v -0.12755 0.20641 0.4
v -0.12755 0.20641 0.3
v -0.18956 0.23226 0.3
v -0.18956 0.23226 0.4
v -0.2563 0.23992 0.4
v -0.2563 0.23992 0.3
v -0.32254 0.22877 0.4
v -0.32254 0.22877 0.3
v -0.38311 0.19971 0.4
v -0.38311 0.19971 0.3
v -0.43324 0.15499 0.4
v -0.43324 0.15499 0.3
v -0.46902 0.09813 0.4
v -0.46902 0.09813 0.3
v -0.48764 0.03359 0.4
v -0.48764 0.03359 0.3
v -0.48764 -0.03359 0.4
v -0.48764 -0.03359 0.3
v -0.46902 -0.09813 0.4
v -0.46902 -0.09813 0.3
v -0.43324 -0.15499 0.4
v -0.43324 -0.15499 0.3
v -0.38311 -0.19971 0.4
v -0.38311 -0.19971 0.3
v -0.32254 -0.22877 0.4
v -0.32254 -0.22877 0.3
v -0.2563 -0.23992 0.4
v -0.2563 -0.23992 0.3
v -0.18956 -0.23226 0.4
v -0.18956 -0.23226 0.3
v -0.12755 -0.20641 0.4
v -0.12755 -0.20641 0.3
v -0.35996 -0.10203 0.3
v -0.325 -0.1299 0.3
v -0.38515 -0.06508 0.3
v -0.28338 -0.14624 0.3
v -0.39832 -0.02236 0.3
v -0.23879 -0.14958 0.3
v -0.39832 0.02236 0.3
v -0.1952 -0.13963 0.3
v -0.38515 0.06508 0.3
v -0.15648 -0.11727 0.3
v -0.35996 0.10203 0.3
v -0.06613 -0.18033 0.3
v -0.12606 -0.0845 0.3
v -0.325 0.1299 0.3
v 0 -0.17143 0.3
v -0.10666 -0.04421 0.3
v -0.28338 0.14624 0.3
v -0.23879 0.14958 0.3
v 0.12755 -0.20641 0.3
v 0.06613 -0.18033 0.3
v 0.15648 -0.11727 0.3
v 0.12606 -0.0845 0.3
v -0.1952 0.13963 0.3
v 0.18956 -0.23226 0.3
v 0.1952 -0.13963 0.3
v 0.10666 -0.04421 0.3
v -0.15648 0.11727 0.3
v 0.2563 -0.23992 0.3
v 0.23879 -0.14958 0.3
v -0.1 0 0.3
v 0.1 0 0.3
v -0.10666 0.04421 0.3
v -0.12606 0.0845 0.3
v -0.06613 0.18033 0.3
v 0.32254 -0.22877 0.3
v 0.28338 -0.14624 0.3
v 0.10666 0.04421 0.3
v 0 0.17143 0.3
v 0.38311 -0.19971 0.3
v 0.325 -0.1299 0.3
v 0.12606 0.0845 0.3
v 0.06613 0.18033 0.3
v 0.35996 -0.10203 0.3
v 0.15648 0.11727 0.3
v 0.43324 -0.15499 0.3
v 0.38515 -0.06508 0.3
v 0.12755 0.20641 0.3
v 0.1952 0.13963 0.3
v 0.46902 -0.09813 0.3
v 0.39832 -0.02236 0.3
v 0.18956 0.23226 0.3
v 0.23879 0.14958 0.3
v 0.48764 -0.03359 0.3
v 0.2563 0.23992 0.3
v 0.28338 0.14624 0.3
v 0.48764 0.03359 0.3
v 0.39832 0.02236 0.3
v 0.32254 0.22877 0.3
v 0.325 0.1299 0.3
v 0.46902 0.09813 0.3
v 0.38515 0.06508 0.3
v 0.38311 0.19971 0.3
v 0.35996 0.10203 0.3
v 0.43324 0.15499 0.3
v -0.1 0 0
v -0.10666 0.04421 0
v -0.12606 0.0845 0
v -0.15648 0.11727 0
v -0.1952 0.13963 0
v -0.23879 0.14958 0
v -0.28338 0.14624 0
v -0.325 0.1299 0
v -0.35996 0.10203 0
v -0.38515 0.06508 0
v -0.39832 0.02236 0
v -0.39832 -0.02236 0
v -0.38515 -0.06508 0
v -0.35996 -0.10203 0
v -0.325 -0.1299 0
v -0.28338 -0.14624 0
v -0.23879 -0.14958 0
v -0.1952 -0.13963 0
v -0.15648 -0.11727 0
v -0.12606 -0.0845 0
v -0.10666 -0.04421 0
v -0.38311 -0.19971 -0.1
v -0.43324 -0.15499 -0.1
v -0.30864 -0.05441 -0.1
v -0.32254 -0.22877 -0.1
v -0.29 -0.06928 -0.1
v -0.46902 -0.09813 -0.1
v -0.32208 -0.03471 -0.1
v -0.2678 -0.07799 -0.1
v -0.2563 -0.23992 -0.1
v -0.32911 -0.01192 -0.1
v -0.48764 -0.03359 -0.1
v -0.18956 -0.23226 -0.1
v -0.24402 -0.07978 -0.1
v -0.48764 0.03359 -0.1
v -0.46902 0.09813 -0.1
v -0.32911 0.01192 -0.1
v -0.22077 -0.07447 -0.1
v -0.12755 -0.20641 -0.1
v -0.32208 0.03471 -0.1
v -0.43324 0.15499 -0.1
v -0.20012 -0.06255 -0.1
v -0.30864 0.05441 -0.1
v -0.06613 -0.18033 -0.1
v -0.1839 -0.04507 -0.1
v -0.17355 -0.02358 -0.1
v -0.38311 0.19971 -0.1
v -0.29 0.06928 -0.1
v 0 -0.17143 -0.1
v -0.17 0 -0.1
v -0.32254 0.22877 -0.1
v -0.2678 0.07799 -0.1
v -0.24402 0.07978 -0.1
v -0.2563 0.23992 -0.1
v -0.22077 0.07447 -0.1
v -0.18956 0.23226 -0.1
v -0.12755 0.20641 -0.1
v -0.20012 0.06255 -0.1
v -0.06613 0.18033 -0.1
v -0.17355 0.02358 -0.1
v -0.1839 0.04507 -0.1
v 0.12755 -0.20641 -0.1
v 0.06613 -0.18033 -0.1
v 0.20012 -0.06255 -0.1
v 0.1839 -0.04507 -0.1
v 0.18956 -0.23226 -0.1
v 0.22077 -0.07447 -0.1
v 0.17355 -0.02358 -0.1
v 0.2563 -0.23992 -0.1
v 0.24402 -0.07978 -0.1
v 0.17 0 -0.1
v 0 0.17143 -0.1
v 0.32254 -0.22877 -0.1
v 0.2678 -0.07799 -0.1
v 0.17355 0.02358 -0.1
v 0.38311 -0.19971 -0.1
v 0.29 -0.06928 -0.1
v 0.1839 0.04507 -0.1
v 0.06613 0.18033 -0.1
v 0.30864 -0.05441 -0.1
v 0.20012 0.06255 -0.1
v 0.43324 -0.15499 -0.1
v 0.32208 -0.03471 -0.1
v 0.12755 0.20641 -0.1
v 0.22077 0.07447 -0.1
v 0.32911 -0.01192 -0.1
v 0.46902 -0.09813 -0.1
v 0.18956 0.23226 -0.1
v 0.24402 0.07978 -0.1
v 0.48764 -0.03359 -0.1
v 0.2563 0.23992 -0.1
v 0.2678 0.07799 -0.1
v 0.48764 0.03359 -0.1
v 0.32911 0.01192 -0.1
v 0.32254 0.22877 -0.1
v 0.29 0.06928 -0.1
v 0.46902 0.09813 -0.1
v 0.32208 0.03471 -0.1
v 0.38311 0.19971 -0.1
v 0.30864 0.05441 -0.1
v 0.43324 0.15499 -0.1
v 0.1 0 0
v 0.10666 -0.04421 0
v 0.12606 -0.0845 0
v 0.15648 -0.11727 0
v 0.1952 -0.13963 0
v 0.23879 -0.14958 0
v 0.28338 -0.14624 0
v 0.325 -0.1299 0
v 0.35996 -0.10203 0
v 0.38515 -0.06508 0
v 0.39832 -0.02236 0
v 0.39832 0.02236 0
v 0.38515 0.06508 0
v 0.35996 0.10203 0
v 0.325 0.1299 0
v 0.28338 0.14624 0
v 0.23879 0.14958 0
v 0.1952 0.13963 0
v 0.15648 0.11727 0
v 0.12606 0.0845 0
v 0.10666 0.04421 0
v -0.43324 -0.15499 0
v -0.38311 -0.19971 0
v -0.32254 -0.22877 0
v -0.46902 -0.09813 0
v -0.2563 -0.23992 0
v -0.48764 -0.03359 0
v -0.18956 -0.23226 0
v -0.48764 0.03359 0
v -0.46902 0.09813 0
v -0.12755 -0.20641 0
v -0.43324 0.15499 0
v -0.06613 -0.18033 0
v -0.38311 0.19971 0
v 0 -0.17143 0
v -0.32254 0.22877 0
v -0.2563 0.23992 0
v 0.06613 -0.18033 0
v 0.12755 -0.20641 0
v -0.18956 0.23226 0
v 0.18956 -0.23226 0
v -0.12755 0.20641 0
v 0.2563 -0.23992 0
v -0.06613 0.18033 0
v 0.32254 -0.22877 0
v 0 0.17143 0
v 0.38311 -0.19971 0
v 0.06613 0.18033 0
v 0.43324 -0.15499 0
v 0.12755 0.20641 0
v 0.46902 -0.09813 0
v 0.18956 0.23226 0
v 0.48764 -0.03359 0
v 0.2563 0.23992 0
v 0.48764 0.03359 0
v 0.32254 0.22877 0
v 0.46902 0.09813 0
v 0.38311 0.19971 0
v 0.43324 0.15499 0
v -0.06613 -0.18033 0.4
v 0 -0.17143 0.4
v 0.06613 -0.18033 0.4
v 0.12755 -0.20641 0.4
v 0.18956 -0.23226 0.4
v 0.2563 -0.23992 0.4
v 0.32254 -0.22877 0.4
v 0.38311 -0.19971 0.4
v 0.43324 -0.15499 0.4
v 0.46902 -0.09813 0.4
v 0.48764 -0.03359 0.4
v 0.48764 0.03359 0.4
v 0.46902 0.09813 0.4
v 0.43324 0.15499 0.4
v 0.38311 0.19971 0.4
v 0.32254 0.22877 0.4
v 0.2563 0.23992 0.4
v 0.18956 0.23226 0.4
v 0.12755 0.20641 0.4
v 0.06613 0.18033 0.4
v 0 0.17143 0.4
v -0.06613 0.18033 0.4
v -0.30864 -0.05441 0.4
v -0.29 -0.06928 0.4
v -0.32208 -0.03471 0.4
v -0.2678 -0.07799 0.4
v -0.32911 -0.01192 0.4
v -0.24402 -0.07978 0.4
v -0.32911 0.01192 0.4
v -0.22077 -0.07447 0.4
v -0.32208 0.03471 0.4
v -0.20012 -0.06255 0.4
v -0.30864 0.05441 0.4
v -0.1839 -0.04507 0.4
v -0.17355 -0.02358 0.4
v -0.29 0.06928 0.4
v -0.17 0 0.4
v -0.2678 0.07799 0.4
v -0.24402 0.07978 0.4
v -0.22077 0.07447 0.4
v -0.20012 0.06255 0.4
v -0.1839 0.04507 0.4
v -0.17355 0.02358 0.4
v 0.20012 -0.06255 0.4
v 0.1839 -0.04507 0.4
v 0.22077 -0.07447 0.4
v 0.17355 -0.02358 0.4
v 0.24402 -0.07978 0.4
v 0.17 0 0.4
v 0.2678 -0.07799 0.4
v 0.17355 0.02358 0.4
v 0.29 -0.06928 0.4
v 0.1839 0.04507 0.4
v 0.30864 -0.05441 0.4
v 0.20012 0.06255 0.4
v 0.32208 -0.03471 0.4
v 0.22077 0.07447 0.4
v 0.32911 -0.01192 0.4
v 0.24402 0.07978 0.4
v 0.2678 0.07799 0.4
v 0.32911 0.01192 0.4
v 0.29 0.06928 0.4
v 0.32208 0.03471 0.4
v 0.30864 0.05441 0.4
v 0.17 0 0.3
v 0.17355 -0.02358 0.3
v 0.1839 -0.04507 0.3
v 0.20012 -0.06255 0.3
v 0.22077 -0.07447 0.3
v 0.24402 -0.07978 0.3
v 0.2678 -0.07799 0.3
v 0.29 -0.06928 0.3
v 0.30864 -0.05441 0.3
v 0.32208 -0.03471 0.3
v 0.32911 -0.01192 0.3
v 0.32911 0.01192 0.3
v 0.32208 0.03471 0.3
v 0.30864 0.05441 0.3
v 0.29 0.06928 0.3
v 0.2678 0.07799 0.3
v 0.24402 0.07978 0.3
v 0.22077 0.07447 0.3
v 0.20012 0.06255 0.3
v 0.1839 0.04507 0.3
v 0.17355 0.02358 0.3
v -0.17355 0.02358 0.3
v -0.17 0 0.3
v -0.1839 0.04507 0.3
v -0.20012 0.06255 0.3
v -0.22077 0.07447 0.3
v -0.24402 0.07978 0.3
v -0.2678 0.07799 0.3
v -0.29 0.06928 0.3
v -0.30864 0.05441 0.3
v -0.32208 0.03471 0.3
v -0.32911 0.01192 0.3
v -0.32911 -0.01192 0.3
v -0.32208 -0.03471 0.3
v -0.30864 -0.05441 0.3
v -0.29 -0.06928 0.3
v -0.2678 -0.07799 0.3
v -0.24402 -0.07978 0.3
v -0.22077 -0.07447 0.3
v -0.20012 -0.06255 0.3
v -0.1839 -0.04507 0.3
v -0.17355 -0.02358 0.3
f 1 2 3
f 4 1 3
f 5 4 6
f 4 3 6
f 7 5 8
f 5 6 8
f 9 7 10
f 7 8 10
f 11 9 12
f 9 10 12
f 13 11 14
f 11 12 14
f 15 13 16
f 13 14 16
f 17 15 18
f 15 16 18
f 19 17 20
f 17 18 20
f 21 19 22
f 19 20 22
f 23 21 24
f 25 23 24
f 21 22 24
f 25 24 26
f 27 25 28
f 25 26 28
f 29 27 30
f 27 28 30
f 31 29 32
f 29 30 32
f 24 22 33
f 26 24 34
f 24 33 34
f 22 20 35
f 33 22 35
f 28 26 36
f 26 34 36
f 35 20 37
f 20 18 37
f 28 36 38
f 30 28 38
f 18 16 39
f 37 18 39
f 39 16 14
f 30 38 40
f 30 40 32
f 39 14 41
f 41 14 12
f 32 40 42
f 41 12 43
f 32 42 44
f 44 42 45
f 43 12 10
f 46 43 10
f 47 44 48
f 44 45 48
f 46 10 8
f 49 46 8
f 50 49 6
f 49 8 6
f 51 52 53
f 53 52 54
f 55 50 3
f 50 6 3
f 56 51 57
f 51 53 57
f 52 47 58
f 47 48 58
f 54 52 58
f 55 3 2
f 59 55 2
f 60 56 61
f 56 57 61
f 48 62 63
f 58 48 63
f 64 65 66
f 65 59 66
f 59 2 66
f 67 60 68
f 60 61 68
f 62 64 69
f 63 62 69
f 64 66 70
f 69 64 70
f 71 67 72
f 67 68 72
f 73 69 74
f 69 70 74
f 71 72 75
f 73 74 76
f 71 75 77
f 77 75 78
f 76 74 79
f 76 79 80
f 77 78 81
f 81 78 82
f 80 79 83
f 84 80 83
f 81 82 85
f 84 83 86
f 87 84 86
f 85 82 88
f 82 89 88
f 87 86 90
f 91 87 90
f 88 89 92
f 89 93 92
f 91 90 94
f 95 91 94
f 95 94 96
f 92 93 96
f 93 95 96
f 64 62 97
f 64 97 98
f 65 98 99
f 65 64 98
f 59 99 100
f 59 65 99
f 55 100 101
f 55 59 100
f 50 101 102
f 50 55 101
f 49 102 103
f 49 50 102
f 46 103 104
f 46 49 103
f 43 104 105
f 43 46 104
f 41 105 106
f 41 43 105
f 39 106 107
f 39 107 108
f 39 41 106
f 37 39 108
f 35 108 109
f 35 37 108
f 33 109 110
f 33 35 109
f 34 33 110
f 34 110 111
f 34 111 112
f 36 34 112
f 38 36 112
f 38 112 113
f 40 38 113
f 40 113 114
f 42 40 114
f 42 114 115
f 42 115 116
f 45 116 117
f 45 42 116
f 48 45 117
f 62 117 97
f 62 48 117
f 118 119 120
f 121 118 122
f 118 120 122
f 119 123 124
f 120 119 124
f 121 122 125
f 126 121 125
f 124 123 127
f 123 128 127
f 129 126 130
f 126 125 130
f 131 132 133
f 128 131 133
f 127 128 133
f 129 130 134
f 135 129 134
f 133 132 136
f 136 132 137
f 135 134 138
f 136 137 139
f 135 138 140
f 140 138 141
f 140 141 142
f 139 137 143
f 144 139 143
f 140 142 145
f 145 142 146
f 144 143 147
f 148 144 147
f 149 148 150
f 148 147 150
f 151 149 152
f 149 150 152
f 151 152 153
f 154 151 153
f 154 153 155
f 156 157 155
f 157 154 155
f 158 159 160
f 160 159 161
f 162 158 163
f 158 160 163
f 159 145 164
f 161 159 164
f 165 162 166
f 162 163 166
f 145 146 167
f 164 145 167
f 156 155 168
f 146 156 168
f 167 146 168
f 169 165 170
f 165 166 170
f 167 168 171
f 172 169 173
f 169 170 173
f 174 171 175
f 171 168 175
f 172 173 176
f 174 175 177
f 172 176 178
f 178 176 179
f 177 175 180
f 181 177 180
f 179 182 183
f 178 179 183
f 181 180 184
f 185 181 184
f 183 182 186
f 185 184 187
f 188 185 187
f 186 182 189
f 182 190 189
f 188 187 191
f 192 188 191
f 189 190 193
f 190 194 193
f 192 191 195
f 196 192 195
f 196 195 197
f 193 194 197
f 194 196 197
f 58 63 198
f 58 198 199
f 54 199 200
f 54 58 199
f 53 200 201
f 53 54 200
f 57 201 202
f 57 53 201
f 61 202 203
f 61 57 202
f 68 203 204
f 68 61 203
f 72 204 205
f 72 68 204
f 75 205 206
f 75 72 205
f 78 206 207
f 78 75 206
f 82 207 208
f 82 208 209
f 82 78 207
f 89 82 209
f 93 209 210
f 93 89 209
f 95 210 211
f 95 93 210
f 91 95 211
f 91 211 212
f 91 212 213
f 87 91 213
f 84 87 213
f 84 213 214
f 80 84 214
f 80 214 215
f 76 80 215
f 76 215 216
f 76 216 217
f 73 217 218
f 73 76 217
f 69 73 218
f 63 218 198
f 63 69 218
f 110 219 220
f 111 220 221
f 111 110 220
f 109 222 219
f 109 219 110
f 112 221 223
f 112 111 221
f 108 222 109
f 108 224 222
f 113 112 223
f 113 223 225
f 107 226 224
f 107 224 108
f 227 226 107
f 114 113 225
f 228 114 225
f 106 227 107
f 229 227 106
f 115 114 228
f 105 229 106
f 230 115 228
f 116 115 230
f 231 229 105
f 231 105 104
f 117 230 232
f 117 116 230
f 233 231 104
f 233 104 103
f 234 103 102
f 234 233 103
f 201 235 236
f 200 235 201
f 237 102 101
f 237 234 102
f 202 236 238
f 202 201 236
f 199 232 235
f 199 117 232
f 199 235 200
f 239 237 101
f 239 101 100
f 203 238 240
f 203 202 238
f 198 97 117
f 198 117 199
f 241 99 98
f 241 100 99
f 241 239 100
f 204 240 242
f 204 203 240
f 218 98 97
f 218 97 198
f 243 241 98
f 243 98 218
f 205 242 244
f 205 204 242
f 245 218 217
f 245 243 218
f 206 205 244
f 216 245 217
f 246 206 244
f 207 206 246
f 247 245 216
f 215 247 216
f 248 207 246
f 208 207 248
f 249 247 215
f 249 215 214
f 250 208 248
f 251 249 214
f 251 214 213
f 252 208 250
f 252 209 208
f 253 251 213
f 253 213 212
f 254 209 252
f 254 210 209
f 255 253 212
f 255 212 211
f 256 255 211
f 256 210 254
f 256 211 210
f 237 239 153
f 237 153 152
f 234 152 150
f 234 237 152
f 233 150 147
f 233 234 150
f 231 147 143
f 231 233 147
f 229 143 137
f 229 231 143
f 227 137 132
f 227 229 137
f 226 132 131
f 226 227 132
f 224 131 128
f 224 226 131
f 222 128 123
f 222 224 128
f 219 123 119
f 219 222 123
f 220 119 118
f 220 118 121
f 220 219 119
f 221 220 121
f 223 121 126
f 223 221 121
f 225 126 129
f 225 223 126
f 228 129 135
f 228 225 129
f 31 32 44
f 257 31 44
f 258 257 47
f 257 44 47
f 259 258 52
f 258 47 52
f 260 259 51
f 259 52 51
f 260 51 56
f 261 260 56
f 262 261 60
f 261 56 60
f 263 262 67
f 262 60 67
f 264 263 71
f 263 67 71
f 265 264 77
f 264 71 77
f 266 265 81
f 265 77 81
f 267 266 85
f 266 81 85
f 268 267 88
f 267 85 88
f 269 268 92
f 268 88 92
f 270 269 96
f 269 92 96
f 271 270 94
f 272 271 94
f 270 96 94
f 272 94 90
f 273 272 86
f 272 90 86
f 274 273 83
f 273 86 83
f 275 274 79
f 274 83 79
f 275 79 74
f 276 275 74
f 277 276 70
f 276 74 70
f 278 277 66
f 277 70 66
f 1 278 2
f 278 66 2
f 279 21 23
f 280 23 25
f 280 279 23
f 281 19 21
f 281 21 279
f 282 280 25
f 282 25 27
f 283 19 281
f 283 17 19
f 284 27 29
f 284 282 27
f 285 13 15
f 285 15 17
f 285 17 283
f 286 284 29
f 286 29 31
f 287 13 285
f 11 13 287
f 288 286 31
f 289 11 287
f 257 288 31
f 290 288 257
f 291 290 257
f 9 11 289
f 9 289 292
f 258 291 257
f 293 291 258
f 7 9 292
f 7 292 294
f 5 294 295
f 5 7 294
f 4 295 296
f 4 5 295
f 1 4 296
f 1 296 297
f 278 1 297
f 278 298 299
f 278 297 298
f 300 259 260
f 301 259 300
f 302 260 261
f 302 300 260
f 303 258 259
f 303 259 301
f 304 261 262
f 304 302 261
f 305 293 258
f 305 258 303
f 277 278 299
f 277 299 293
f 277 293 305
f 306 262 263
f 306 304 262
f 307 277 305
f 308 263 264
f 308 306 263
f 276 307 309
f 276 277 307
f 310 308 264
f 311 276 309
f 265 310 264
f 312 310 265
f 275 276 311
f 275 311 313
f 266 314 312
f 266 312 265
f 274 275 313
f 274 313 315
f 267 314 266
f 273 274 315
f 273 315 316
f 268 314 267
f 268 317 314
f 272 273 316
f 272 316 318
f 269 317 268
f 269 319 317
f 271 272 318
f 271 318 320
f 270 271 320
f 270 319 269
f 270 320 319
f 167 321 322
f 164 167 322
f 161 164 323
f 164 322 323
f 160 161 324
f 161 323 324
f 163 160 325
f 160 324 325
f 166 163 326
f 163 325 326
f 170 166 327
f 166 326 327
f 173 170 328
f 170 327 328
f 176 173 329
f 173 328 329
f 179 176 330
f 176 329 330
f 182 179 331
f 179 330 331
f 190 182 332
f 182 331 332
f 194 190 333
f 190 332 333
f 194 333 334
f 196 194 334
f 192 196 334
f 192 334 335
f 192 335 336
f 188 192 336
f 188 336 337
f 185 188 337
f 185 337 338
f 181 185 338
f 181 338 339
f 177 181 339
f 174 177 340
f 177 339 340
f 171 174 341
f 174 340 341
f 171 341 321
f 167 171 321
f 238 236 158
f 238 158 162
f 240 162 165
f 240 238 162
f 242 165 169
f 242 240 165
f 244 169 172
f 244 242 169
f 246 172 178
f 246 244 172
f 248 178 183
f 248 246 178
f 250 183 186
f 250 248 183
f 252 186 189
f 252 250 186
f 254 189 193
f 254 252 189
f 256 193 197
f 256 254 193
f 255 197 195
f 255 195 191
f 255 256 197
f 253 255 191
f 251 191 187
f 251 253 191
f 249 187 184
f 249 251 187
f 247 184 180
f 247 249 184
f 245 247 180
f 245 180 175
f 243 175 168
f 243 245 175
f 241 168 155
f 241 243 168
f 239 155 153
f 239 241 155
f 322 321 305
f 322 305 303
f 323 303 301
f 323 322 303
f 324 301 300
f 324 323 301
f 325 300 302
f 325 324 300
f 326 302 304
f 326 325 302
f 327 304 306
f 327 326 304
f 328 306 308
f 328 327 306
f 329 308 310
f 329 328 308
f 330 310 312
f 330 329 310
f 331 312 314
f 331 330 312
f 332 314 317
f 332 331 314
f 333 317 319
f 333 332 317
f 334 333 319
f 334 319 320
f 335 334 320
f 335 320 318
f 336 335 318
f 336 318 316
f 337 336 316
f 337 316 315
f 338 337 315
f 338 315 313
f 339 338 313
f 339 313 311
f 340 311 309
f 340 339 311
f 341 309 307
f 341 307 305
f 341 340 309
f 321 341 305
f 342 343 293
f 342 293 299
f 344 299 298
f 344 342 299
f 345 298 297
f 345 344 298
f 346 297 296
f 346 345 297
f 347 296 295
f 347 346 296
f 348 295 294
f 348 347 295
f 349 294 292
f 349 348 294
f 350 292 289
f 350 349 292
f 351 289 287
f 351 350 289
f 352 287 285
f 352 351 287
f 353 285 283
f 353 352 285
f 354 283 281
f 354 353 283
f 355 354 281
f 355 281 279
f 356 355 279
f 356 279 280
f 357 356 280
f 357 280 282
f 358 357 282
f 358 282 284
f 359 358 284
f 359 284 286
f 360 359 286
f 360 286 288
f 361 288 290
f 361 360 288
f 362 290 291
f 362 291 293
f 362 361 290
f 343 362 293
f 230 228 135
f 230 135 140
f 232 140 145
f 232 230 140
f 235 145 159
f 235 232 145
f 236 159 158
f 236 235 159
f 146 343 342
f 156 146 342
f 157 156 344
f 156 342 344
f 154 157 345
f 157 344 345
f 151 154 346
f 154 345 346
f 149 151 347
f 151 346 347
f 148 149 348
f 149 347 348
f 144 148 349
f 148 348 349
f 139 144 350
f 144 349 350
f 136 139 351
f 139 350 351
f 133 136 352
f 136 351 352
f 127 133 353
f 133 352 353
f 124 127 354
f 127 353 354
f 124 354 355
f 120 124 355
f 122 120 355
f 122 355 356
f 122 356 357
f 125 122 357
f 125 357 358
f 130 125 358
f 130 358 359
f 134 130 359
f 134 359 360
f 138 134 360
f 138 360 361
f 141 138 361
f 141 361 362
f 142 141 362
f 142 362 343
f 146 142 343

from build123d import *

# Parameters (mm, degrees)
SKETCH1_R           = 0.08
BOSS_EXTRUDE1_DEPTH = 0.1
BOSS_EXTRUDE2_START = 0.3
SKETCH2_R           = 0.15
SKETCH2_R_2         = 0.08
BOSS_EXTRUDE2_DEPTH = 0.3


with BuildPart() as part:
    # Sketch1 → Boss-Extrude1 (new body)
    with BuildSketch(Plane.XY):
        with BuildLine():
            ThreePointArc((-0.12755102, 0.206412808), (-0.49, 0), (-0.12755102, -0.206412808))
            ThreePointArc((-0.12755102, -0.206412808), (0, -0.17142615), (0.12755102, -0.206412808))
            ThreePointArc((0.12755102, -0.206412808), (0.49, 0), (0.12755102, 0.206412808))
            ThreePointArc((0.12755102, 0.206412808), (0, 0.17142615), (-0.12755102, 0.206412808))
        make_face()
        with Locations((-0.25, 0)):
            Circle(SKETCH1_R, mode=Mode.SUBTRACT)
        with Locations(Location((0.25, 0, 0), (0, 0, 180))):
            Circle(SKETCH1_R, mode=Mode.SUBTRACT)
    boss_extrude1 = extrude(amount=-BOSS_EXTRUDE1_DEPTH)

    # Sketch2 → Boss-Extrude2 (add)
    # profile 1 of 2: a face of its own
    with BuildSketch(Plane.XY.offset(BOSS_EXTRUDE2_START)):
        with Locations((-0.25, 0)):
            Circle(SKETCH2_R)
        with Locations((-0.25, 0)):
            Circle(SKETCH2_R_2, mode=Mode.SUBTRACT)
    # profile 2 of 2: a face of its own
    with BuildSketch(Plane.XY.offset(BOSS_EXTRUDE2_START)):
        with Locations(Location((0.25, 0, 0), (0, 0, 180))):
            Circle(SKETCH2_R)
        with Locations(Location((0.25, 0, 0), (0, 0, 180))):
            Circle(SKETCH2_R_2, mode=Mode.SUBTRACT)
    extrude(amount=-BOSS_EXTRUDE2_DEPTH)

    # Mirror1: Boss-Extrude1 across plane
    add(boss_extrude1.mirror(Plane.XY.offset(0.15)))


solid = part.part
